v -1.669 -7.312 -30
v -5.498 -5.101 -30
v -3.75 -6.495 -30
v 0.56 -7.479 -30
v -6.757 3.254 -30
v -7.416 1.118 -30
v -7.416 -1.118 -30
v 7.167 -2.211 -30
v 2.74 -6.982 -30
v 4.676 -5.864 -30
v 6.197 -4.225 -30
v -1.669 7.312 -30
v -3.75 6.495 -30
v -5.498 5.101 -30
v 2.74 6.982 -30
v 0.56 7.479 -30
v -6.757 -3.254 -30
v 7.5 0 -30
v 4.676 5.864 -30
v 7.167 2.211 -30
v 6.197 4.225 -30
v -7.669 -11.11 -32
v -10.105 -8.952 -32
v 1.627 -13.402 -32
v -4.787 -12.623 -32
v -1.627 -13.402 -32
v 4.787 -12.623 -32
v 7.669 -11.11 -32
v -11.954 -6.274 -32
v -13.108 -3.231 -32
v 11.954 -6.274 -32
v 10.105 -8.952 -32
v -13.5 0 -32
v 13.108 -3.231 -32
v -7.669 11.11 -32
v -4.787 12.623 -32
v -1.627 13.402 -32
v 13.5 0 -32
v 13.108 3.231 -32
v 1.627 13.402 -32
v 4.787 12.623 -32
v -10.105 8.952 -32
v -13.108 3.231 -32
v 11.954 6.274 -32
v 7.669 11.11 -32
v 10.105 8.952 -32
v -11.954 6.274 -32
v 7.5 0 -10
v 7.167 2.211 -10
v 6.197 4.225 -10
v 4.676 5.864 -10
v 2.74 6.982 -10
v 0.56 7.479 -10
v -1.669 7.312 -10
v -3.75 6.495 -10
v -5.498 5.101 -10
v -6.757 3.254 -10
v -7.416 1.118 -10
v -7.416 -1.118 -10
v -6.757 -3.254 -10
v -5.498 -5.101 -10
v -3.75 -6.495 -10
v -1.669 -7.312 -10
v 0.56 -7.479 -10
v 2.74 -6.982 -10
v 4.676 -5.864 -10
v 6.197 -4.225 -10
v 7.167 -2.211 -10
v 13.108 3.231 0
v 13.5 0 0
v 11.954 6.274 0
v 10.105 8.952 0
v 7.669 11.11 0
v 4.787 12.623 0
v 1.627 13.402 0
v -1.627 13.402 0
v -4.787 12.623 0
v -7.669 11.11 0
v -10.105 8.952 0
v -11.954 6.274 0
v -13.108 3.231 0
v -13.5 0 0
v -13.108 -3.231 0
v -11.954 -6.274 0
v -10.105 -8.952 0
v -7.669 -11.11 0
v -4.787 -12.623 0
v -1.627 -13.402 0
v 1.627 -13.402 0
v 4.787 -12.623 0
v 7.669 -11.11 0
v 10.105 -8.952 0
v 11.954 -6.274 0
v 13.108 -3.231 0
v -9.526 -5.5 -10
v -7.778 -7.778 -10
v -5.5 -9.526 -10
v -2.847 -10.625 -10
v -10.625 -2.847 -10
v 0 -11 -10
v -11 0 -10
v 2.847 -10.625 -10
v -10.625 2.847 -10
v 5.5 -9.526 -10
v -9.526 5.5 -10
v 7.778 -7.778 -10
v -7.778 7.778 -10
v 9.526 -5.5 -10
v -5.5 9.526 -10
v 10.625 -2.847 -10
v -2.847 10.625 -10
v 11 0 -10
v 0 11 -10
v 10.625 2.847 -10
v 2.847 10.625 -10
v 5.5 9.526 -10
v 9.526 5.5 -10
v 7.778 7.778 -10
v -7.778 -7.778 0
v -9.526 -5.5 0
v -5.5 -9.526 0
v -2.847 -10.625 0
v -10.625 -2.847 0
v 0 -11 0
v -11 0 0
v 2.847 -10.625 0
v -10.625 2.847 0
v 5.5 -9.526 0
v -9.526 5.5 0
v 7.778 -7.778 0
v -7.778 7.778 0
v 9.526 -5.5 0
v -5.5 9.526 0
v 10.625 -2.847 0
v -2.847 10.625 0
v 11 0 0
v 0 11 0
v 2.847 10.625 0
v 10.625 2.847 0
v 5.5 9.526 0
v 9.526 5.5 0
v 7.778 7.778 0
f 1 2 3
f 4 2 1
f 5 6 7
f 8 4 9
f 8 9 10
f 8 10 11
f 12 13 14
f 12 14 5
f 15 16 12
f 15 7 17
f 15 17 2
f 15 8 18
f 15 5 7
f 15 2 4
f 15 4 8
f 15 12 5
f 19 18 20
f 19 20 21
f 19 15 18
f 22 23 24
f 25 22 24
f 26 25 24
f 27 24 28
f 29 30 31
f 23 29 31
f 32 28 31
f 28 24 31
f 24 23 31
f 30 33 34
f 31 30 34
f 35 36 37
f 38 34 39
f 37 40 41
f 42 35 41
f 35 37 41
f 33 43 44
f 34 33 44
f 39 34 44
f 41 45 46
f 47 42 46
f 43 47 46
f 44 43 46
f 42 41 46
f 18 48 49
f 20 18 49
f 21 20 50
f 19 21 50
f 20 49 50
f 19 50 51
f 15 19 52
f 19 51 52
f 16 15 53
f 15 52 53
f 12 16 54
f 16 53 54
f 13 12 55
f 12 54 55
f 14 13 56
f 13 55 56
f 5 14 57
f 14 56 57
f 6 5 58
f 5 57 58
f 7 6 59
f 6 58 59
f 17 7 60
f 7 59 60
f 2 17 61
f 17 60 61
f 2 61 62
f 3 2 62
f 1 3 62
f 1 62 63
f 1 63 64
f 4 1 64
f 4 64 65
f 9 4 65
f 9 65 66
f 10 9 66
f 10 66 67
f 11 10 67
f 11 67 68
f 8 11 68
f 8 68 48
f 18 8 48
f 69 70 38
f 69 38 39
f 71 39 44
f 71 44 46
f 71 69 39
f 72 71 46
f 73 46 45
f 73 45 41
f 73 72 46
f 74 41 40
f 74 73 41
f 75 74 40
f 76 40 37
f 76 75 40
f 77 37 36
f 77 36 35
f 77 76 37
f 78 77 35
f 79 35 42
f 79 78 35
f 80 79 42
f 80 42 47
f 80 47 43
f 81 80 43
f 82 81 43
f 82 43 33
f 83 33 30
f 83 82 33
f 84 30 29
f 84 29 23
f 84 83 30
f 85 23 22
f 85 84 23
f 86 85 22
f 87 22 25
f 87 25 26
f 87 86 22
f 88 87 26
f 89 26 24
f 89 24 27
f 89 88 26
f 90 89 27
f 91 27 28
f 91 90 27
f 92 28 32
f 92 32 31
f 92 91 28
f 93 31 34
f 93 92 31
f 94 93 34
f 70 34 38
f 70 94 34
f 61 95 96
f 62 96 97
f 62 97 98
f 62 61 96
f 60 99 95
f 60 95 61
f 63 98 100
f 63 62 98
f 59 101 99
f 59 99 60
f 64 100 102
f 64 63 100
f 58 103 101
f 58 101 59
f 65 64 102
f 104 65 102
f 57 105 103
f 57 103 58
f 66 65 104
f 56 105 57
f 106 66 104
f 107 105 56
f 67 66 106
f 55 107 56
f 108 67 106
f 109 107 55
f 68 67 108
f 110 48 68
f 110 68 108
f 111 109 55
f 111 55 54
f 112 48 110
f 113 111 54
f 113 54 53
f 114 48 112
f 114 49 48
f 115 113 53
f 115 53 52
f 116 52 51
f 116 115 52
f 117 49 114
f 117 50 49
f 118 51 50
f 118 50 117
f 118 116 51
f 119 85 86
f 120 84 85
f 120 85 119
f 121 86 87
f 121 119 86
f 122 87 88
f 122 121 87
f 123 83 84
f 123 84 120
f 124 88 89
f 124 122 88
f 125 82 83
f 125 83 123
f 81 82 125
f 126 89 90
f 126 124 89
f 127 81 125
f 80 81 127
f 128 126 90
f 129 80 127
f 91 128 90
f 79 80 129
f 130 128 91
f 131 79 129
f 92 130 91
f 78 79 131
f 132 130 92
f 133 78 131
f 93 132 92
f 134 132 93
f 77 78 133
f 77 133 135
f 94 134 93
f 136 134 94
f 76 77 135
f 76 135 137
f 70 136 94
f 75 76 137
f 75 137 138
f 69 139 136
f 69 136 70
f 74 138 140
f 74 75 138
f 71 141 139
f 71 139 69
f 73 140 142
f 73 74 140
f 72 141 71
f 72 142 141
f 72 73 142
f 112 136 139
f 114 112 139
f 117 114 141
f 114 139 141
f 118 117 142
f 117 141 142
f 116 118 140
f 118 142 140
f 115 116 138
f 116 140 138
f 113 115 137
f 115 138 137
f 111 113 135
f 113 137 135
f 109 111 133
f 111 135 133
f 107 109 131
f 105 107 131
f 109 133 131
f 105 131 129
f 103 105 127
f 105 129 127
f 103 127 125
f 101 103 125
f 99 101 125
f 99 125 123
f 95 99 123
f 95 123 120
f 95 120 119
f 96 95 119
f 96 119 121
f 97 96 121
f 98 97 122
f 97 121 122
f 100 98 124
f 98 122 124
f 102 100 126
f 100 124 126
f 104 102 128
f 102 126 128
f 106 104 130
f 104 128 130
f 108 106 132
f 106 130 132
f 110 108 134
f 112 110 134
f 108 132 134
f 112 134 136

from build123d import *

# Parameters (mm, degrees)
SKETCH2_R           = 13.5
BOSS_EXTRUDE1_DEPTH = 32
SKETCH4_R           = 11
CUT_EXTRUDE1_DEPTH  = 10
SKETCH5_R           = 7.5
CUT_EXTRUDE2_DEPTH  = 30


with BuildPart() as part:
    # Sketch2 → Boss-Extrude1 (new body)
    with BuildSketch(Plane.XY):
        Circle(SKETCH2_R)
    extrude(amount=-BOSS_EXTRUDE1_DEPTH)

    # Sketch4 → Cut-Extrude1 (cut)
    with BuildSketch(Plane.XY):
        Circle(SKETCH4_R)
    extrude(amount=-CUT_EXTRUDE1_DEPTH, mode=Mode.SUBTRACT)

    # Sketch5 → Cut-Extrude2 (cut)
    with BuildSketch(Plane.XY):
        Circle(SKETCH5_R)
    extrude(amount=-CUT_EXTRUDE2_DEPTH, mode=Mode.SUBTRACT)


solid = part.part
